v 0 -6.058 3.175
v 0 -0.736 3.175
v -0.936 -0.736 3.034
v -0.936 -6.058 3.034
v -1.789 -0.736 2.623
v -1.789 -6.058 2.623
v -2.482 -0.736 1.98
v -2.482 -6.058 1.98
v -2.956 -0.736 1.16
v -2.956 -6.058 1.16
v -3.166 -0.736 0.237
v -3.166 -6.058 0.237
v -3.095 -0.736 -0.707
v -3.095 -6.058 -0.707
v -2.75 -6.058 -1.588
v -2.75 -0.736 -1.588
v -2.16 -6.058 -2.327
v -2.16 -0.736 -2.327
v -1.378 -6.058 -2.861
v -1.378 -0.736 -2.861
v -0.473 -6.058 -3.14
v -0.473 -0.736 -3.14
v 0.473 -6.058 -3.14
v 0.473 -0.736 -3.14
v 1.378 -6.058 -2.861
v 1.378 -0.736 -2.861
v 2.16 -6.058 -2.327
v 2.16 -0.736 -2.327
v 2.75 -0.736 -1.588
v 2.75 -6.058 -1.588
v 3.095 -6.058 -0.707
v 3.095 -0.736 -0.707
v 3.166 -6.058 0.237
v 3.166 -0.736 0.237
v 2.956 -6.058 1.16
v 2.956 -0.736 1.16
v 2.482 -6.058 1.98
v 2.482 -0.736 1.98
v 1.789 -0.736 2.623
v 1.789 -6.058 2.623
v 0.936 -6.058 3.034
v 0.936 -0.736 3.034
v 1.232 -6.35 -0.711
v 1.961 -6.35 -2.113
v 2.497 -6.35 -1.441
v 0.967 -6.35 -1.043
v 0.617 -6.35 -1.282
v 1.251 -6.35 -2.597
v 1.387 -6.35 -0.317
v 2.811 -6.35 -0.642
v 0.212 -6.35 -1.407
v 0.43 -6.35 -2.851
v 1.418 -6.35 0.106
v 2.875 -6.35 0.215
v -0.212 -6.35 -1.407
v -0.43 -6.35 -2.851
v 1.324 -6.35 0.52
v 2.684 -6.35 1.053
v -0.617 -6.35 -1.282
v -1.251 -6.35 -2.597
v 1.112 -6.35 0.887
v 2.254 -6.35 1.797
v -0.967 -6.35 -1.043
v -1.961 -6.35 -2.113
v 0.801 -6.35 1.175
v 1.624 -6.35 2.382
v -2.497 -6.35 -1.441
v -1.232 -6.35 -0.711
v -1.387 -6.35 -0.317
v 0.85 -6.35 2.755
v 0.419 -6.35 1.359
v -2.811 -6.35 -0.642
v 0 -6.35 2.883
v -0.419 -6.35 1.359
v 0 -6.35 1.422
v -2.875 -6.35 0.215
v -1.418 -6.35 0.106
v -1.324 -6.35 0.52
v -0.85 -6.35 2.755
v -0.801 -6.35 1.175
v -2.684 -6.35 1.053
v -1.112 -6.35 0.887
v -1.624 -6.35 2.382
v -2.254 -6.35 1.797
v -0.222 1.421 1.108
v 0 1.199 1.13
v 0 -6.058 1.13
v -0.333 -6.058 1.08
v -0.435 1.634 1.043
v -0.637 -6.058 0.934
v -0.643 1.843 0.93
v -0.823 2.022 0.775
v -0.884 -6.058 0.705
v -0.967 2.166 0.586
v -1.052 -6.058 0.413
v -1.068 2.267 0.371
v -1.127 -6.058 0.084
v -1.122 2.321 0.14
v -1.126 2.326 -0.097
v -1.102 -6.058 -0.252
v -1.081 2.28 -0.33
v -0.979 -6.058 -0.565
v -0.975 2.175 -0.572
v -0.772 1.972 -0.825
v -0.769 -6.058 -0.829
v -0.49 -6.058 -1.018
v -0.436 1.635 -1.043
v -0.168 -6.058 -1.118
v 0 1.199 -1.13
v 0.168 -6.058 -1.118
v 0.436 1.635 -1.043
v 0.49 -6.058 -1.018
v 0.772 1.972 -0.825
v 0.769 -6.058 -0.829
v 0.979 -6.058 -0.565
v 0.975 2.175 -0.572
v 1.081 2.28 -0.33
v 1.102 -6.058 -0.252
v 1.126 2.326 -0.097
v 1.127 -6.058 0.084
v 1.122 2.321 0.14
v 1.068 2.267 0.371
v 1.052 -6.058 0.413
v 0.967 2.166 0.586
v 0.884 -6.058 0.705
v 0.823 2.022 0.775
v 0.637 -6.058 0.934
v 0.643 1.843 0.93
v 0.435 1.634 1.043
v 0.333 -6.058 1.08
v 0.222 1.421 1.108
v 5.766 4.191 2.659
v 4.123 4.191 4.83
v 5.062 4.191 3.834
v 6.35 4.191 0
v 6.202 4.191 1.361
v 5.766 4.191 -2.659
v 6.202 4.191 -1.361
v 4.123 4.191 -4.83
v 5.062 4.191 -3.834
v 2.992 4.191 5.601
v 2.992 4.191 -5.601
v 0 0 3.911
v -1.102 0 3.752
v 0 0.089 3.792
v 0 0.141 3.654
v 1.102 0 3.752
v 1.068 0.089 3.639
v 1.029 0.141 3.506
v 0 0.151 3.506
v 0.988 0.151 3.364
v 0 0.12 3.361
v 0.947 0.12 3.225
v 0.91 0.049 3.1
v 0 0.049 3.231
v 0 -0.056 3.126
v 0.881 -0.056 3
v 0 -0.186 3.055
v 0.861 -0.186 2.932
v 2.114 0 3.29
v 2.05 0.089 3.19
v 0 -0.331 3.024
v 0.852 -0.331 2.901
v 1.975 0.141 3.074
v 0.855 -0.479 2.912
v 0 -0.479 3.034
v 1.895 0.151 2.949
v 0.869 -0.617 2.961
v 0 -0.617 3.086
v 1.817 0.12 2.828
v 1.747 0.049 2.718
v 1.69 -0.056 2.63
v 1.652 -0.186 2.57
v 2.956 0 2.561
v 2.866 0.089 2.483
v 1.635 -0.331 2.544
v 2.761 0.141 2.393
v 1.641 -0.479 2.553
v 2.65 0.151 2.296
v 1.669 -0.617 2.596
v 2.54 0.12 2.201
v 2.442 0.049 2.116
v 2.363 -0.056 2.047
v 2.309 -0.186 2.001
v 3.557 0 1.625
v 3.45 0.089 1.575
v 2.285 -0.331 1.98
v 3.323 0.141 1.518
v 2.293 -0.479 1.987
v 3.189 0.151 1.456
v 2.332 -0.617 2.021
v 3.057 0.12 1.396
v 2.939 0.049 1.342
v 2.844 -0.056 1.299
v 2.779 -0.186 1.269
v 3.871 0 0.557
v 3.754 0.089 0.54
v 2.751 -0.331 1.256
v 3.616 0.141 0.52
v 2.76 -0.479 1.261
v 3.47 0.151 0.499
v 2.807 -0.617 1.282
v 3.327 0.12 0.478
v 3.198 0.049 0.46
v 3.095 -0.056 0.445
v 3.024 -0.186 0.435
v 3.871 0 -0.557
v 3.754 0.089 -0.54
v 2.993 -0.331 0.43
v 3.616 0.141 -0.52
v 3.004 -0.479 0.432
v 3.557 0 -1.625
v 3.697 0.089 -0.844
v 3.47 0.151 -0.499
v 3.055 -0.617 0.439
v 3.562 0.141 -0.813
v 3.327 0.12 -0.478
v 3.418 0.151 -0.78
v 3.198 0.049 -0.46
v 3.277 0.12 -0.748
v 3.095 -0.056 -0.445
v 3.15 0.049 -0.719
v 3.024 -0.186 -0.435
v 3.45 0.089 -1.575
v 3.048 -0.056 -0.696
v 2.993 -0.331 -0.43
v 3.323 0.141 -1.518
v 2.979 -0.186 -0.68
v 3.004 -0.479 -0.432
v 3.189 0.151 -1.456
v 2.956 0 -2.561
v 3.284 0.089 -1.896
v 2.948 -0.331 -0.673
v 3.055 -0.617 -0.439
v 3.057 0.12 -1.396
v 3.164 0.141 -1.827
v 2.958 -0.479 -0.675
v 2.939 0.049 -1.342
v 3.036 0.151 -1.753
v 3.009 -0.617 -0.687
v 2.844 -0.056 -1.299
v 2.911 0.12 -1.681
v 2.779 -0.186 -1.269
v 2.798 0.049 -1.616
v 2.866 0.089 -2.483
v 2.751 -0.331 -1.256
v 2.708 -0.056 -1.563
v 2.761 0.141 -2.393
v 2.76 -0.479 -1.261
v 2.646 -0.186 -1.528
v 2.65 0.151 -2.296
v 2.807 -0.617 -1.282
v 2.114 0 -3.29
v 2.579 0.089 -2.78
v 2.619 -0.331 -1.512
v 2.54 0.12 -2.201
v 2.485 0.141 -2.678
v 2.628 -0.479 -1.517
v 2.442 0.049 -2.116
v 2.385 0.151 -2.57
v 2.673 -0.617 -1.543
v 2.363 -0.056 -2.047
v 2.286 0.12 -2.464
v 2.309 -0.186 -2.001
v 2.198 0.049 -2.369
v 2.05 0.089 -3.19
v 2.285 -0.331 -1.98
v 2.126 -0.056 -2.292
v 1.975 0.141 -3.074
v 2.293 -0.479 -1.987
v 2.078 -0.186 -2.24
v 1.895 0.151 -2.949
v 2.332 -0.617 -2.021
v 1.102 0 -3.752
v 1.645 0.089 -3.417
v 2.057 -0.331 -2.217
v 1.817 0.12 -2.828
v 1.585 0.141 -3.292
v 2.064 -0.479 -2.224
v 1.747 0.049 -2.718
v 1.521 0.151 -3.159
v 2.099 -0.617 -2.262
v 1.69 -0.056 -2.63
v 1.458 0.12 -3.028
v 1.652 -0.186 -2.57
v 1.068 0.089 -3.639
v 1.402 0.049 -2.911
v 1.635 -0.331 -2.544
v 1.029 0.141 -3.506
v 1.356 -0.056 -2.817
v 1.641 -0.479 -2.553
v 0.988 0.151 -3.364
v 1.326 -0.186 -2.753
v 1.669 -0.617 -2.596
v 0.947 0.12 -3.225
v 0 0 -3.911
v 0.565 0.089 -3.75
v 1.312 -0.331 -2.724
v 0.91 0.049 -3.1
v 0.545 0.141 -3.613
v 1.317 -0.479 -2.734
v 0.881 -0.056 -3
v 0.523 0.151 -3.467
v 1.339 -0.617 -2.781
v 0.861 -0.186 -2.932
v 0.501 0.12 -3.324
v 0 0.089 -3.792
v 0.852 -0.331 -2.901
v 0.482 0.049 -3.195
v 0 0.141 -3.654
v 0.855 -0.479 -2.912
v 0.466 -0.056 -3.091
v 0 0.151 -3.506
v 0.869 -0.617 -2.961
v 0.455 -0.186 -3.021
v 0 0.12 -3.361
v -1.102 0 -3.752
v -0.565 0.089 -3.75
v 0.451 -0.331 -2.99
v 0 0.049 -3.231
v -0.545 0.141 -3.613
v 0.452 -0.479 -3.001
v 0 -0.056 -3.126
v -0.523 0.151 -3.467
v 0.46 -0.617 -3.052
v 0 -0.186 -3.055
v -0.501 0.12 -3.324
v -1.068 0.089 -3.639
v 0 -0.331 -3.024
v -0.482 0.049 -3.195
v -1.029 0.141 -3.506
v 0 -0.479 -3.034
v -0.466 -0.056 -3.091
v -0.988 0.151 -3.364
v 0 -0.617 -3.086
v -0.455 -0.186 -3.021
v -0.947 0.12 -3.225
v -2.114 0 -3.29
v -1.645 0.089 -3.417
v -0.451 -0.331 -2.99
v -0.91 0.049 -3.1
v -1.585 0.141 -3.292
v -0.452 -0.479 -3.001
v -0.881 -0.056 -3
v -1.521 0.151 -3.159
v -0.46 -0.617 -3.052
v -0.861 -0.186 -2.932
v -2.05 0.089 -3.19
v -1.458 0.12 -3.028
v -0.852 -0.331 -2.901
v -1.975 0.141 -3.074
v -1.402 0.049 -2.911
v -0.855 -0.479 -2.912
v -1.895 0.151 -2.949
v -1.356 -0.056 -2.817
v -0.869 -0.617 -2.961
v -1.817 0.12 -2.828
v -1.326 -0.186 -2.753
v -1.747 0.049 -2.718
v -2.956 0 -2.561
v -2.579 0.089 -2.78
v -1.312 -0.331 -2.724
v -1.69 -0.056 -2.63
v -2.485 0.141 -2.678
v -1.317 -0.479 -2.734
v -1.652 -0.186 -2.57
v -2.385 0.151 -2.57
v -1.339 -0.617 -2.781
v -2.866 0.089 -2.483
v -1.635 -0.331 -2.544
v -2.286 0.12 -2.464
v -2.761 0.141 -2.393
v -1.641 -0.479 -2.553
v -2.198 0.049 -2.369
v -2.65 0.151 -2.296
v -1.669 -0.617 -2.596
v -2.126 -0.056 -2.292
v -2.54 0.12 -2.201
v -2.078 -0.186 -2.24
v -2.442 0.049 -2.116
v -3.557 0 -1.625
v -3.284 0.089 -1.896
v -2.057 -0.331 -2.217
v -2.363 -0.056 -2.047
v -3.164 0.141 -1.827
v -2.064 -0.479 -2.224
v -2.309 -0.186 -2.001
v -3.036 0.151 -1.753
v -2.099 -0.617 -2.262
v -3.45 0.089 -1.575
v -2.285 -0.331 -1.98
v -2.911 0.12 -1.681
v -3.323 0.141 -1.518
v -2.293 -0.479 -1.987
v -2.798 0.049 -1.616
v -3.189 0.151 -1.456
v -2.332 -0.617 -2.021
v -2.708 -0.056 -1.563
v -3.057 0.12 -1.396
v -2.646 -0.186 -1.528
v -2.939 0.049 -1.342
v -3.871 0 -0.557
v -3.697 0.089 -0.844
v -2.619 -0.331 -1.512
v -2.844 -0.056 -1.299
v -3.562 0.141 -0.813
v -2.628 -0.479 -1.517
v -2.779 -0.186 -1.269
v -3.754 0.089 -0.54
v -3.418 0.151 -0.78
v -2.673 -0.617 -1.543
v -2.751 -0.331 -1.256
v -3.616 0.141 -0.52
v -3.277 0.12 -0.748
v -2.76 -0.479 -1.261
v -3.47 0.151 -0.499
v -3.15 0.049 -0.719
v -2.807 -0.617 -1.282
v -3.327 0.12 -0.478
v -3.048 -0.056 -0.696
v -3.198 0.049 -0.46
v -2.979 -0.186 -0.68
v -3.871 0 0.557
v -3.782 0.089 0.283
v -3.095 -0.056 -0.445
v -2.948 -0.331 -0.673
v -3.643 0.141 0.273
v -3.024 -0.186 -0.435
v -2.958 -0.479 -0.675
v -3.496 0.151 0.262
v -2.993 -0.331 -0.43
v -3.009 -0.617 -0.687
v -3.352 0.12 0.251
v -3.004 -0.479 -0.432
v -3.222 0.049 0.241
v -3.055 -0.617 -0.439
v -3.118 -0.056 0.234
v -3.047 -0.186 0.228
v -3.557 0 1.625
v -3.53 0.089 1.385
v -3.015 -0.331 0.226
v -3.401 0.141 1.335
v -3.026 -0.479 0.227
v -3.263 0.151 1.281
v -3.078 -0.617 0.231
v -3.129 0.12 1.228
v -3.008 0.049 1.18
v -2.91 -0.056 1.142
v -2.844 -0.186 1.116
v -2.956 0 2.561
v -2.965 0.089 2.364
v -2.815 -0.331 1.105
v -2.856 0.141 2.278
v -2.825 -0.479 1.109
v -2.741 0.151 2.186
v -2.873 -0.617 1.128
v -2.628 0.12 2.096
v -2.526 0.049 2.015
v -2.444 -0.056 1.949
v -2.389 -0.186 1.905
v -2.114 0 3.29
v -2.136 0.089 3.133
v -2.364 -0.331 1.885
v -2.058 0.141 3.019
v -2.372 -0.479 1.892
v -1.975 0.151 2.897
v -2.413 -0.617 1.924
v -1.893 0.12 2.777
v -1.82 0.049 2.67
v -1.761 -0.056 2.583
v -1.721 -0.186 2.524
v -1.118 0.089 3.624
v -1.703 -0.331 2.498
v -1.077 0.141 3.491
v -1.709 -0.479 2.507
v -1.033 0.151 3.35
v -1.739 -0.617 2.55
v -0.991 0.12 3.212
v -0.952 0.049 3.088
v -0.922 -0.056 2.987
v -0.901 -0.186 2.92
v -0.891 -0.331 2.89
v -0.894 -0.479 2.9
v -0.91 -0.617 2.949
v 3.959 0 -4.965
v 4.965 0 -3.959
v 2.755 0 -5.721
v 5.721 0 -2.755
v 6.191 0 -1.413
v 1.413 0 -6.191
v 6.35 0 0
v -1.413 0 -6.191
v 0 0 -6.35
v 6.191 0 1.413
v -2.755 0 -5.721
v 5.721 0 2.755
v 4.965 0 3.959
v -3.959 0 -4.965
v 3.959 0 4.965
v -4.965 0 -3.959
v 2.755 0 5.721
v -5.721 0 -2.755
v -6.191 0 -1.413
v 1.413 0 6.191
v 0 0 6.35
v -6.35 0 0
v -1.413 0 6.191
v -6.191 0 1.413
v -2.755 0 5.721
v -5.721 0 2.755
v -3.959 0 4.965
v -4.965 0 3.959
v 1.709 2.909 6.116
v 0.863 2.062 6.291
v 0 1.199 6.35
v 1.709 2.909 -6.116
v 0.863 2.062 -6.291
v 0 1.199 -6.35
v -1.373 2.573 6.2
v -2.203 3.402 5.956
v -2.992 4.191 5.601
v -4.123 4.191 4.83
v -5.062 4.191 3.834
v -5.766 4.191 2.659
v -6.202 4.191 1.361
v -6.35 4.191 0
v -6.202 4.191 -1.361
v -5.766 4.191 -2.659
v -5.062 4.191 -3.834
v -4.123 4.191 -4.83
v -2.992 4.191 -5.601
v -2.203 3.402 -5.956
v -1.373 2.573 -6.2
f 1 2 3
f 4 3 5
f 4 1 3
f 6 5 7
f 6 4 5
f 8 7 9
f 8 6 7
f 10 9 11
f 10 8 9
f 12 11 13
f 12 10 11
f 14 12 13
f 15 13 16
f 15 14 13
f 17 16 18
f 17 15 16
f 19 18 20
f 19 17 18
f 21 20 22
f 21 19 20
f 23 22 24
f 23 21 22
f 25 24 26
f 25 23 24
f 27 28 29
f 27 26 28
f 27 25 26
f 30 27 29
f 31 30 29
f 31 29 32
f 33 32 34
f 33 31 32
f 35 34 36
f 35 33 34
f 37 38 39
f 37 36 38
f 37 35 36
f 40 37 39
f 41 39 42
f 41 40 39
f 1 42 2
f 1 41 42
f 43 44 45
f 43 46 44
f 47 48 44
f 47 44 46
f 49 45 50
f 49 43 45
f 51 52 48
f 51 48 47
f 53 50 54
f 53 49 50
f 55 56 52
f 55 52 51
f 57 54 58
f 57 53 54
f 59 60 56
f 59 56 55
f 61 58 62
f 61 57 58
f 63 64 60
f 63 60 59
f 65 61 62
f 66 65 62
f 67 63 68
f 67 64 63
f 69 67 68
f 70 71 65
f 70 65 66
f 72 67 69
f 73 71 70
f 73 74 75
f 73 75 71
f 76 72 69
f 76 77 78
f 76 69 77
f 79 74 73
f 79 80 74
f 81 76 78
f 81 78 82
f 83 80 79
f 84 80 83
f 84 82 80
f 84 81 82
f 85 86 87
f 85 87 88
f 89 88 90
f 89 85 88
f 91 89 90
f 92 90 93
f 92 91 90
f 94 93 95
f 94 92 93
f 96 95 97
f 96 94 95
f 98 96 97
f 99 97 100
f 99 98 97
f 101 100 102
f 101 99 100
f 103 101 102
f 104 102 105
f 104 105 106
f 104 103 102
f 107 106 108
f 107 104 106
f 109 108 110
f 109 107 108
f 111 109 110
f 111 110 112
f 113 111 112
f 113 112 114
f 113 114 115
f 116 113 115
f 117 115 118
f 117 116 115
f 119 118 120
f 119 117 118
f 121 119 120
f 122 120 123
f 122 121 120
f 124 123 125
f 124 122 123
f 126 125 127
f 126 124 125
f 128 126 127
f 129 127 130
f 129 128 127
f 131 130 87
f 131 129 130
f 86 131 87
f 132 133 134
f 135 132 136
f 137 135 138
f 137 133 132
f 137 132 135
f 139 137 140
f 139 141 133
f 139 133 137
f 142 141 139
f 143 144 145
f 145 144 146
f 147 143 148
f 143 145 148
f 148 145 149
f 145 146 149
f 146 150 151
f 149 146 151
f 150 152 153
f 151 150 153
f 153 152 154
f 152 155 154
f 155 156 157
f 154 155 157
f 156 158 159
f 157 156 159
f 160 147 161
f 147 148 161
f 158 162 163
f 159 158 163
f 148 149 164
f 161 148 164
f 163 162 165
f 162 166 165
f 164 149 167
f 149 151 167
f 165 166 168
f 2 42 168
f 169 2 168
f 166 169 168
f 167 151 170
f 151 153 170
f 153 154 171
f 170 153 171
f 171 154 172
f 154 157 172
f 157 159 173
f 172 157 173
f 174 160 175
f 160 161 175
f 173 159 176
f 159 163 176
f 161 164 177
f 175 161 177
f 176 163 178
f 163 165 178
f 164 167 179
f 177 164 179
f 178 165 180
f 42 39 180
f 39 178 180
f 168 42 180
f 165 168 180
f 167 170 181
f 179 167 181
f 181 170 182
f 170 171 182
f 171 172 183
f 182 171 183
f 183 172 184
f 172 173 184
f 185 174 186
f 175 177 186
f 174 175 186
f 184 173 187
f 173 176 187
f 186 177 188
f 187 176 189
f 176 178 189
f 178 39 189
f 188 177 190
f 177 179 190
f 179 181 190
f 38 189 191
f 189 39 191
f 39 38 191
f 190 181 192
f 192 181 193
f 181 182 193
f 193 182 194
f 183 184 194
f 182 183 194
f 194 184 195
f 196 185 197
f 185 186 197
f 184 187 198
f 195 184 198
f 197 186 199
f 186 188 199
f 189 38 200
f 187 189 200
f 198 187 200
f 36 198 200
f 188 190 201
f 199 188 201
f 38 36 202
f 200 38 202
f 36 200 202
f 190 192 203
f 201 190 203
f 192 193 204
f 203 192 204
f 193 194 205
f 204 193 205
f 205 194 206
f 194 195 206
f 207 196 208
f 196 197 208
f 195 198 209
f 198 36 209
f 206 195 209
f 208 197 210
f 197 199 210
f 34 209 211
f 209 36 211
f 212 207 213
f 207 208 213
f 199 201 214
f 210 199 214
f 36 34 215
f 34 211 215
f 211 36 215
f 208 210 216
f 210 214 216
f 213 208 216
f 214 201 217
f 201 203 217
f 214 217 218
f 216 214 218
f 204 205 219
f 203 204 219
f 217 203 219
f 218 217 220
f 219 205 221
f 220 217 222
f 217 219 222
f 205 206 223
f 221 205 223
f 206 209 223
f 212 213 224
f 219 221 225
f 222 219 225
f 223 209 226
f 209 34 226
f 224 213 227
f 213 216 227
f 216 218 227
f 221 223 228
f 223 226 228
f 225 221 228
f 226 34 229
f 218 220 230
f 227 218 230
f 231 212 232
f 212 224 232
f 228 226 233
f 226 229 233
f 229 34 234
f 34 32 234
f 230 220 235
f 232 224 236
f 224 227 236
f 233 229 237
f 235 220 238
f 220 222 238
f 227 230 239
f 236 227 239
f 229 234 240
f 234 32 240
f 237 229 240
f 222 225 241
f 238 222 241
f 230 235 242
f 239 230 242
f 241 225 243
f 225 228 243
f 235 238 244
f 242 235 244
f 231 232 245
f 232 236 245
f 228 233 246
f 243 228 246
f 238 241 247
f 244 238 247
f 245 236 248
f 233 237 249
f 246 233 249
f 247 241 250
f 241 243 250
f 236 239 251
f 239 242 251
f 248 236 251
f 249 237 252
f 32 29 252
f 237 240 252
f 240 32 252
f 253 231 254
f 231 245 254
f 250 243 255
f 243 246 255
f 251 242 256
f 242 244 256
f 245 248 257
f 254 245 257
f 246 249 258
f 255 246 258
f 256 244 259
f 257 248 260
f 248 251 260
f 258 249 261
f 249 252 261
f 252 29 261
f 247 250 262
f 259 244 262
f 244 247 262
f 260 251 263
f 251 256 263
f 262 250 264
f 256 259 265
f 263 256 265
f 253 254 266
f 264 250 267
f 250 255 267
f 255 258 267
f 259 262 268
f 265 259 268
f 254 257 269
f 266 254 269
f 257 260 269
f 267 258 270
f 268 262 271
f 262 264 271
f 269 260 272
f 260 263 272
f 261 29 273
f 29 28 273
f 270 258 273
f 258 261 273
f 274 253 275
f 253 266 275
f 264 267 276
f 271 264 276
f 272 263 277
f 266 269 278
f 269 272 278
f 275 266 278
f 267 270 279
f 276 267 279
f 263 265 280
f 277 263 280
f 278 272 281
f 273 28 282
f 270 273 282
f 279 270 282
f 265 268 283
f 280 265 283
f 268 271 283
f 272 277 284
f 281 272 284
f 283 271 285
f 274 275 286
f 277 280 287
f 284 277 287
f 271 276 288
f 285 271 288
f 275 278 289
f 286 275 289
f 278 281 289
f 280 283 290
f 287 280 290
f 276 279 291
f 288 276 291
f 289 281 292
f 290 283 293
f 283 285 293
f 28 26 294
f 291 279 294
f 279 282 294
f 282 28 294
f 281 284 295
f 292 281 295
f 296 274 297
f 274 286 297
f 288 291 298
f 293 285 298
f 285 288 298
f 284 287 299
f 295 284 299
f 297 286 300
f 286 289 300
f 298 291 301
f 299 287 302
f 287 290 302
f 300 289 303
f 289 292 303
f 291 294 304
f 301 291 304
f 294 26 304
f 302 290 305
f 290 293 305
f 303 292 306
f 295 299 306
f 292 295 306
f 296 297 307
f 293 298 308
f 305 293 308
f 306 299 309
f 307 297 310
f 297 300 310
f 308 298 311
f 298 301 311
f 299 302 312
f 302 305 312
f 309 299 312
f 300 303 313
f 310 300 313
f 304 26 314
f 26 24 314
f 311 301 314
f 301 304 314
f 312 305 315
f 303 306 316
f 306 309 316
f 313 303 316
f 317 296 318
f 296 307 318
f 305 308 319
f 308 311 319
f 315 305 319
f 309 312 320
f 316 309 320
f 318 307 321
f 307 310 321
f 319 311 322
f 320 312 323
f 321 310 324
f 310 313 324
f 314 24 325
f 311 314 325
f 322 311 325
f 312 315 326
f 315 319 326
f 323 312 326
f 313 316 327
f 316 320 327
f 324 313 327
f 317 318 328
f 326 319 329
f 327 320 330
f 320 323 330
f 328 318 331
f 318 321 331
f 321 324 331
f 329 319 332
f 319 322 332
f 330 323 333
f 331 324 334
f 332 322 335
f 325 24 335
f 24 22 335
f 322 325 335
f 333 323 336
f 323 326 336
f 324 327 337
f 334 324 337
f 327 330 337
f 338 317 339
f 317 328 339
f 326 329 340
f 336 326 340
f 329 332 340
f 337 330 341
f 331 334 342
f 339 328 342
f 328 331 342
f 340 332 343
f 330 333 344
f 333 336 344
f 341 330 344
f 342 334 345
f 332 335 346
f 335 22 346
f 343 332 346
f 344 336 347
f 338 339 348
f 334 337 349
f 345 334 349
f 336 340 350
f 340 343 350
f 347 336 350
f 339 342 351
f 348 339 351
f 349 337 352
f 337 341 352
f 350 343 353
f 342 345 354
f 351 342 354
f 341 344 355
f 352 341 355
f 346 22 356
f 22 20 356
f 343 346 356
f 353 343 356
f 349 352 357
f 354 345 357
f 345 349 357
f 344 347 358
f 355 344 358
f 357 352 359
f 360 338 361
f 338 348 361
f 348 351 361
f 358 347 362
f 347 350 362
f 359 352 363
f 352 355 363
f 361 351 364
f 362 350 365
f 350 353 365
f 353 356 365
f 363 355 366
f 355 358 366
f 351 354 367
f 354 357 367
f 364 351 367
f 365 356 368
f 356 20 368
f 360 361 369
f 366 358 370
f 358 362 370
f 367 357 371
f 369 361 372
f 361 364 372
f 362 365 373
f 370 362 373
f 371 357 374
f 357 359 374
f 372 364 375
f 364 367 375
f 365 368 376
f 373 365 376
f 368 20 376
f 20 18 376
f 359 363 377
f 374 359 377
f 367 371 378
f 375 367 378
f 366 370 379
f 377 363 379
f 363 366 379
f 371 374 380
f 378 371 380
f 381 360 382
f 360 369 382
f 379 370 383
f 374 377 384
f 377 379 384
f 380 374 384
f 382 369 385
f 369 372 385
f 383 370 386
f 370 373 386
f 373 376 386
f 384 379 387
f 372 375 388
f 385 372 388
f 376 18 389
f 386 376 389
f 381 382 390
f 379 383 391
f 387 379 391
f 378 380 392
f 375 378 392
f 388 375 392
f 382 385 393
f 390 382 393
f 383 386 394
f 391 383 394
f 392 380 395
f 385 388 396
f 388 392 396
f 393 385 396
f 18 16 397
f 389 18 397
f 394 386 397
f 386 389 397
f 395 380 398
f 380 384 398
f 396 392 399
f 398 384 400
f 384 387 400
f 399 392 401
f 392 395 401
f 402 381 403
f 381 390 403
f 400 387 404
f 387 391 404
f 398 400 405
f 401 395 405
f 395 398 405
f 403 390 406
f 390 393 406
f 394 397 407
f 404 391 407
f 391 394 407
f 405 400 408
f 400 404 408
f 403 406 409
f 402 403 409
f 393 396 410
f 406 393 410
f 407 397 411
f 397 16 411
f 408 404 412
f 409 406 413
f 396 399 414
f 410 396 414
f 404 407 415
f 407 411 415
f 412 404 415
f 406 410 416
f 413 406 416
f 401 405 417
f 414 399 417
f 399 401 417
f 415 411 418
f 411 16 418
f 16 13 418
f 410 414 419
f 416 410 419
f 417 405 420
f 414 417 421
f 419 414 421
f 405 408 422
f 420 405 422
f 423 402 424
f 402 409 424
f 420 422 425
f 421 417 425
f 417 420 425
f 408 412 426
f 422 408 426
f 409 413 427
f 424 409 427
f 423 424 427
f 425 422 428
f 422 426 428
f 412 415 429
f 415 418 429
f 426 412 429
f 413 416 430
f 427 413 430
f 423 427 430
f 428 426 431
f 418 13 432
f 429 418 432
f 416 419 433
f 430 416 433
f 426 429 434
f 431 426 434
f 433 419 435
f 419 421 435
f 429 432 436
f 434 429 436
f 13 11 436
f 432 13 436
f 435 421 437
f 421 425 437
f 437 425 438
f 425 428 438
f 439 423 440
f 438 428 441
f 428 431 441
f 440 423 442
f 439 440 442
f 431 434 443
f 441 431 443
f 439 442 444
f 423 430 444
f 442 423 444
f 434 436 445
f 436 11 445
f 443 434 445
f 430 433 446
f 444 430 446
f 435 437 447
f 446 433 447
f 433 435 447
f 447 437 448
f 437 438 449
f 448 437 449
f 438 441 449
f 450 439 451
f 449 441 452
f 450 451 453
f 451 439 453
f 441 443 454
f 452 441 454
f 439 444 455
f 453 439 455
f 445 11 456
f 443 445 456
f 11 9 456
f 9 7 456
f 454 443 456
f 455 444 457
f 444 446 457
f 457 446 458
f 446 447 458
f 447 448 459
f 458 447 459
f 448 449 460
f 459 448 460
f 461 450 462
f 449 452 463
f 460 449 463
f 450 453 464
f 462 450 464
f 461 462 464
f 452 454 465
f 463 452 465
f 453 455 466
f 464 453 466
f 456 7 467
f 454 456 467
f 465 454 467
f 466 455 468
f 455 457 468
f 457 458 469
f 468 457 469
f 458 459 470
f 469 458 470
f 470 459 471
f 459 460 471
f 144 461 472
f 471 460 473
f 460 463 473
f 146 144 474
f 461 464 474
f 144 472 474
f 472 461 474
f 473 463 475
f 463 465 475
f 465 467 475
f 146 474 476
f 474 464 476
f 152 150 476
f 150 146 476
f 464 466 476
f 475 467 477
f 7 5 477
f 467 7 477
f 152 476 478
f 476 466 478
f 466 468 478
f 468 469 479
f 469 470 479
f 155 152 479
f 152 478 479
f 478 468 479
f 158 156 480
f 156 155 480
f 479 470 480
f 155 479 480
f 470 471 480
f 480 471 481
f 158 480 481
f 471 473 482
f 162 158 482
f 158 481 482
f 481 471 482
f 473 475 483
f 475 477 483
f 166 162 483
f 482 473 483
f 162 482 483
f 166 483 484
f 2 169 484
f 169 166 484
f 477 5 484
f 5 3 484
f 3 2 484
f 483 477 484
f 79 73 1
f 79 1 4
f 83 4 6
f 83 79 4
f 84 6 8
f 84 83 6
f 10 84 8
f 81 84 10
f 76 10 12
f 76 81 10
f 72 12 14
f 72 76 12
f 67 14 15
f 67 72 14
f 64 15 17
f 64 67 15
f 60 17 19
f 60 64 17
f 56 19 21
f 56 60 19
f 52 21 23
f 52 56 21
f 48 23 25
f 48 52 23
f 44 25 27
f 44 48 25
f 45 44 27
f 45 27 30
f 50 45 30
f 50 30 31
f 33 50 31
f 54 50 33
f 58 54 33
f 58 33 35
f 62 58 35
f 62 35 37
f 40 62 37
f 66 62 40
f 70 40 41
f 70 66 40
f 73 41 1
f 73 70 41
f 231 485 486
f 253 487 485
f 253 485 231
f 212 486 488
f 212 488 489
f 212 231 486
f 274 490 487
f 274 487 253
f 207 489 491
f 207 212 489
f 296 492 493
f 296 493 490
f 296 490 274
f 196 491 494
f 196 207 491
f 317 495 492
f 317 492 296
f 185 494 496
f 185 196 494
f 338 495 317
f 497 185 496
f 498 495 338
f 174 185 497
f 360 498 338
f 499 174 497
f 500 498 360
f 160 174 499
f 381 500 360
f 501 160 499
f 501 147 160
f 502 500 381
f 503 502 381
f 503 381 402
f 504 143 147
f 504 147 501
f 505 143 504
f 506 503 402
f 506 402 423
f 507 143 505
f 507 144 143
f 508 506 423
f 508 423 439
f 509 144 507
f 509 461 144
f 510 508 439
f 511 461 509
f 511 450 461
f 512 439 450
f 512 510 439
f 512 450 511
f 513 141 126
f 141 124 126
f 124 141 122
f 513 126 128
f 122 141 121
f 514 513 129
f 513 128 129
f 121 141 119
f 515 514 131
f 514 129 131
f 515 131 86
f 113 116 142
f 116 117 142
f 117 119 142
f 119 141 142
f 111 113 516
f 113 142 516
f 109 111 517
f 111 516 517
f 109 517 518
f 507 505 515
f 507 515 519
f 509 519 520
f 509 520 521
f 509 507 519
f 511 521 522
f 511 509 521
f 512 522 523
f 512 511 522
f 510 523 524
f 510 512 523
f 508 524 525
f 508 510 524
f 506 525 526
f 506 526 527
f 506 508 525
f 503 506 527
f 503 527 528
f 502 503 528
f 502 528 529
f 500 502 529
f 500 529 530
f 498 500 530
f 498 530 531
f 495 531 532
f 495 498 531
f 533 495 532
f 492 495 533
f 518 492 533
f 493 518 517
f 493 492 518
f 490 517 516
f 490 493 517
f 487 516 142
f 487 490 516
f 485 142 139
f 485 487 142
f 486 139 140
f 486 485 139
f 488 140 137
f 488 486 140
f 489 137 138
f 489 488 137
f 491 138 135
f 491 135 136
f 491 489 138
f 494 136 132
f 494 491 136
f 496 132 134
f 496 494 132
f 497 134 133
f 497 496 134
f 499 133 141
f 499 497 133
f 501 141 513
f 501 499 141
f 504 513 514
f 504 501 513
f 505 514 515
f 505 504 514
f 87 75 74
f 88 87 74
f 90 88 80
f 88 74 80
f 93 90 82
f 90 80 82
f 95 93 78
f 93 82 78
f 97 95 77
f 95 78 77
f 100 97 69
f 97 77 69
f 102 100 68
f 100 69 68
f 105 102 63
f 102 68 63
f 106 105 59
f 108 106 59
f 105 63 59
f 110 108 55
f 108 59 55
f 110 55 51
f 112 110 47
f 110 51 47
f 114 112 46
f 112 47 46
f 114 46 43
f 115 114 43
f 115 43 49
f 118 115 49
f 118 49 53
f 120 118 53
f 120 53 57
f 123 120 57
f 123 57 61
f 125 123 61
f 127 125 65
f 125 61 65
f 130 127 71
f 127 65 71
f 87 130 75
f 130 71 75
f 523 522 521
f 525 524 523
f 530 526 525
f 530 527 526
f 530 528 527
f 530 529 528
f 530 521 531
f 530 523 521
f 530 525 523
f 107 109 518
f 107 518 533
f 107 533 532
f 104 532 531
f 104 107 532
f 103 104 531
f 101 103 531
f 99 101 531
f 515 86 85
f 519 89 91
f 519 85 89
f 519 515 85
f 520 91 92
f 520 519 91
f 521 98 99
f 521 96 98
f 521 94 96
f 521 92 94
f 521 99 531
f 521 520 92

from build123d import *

# Parameters (mm, degrees)
CUT_EXTRUDE1_DEPTH      = 7.35
CUT_EXTRUDE1_DEPTH_BACK = 7.35
SKETCH7_W               = 1.1303
SKETCH7_H               = 10.541
CHAMFER1_SIZE           = 0.2921


with BuildPart() as part:
    # Sketch9 → Revolve1 (revolve)
    with BuildSketch(Plane.XY, mode=Mode.PRIVATE) as revolve1_sk:
        Polygon((0, 4.191), (6.35, 4.191), (6.35, 0), (3.175, 0), (3.175, -6.35), (0, -6.35), align=None)
    revolve(revolve1_sk.sketch.rotate(Axis((0, 6.439023264, 0), (0, -1, 0)), 90), axis=Axis((0, 6.439023264, 0), (0, -1, 0)))  # turned: the seam where the file's is

    # Sketch3 → Cut-Extrude1 (cut, two sides)
    with BuildSketch(Plane.XY) as cut_extrude1_sk:
        Polygon((-2.991528061, 4.191), (2.991528061, 4.191), (0, 1.199471939), align=None)
    extrude(amount=CUT_EXTRUDE1_DEPTH, mode=Mode.SUBTRACT)
    extrude(cut_extrude1_sk.sketch, amount=-CUT_EXTRUDE1_DEPTH_BACK, mode=Mode.SUBTRACT)

    # Sketch7 → Cut-Revolve1 (revolve, cut)
    with BuildSketch(Plane.XY, mode=Mode.PRIVATE) as cut_revolve1_sk:
        with Locations((0.56515, -1.0795)):
            Rectangle(SKETCH7_W, SKETCH7_H)
    revolve(cut_revolve1_sk.sketch.rotate(Axis((0, 13.979393491, 0), (0, -1, 0)), 90), axis=Axis((0, 13.979393491, 0), (0, -1, 0)), mode=Mode.SUBTRACT)  # turned: the seam where the file's is

    # Chamfer1
    chamfer1_edges = [part.edges().sort_by_distance(p)[0] for p in [
        (0, -6.35, -1.1303),
        (0, -6.35, -3.175),
    ]]
    chamfer(chamfer1_edges, length=CHAMFER1_SIZE)

    # Sketch10 → Cut-Revolve2 (revolve, cut)
    with BuildSketch(Plane.XY, mode=Mode.PRIVATE) as cut_revolve2_sk:
        with BuildLine():
            Line((3.175, -0.735852294), (3.910852294, 0))
            ThreePointArc((3.910852294, 0), (3.175, 0), (3.175, -0.735852294))
        make_face()
    revolve(cut_revolve2_sk.sketch.rotate(Axis((0, 0, 0), (0, 1, 0)), 270), axis=Axis((0, 0, 0), (0, 1, 0)), mode=Mode.SUBTRACT)  # turned: the seam where the file's is


solid = part.part
